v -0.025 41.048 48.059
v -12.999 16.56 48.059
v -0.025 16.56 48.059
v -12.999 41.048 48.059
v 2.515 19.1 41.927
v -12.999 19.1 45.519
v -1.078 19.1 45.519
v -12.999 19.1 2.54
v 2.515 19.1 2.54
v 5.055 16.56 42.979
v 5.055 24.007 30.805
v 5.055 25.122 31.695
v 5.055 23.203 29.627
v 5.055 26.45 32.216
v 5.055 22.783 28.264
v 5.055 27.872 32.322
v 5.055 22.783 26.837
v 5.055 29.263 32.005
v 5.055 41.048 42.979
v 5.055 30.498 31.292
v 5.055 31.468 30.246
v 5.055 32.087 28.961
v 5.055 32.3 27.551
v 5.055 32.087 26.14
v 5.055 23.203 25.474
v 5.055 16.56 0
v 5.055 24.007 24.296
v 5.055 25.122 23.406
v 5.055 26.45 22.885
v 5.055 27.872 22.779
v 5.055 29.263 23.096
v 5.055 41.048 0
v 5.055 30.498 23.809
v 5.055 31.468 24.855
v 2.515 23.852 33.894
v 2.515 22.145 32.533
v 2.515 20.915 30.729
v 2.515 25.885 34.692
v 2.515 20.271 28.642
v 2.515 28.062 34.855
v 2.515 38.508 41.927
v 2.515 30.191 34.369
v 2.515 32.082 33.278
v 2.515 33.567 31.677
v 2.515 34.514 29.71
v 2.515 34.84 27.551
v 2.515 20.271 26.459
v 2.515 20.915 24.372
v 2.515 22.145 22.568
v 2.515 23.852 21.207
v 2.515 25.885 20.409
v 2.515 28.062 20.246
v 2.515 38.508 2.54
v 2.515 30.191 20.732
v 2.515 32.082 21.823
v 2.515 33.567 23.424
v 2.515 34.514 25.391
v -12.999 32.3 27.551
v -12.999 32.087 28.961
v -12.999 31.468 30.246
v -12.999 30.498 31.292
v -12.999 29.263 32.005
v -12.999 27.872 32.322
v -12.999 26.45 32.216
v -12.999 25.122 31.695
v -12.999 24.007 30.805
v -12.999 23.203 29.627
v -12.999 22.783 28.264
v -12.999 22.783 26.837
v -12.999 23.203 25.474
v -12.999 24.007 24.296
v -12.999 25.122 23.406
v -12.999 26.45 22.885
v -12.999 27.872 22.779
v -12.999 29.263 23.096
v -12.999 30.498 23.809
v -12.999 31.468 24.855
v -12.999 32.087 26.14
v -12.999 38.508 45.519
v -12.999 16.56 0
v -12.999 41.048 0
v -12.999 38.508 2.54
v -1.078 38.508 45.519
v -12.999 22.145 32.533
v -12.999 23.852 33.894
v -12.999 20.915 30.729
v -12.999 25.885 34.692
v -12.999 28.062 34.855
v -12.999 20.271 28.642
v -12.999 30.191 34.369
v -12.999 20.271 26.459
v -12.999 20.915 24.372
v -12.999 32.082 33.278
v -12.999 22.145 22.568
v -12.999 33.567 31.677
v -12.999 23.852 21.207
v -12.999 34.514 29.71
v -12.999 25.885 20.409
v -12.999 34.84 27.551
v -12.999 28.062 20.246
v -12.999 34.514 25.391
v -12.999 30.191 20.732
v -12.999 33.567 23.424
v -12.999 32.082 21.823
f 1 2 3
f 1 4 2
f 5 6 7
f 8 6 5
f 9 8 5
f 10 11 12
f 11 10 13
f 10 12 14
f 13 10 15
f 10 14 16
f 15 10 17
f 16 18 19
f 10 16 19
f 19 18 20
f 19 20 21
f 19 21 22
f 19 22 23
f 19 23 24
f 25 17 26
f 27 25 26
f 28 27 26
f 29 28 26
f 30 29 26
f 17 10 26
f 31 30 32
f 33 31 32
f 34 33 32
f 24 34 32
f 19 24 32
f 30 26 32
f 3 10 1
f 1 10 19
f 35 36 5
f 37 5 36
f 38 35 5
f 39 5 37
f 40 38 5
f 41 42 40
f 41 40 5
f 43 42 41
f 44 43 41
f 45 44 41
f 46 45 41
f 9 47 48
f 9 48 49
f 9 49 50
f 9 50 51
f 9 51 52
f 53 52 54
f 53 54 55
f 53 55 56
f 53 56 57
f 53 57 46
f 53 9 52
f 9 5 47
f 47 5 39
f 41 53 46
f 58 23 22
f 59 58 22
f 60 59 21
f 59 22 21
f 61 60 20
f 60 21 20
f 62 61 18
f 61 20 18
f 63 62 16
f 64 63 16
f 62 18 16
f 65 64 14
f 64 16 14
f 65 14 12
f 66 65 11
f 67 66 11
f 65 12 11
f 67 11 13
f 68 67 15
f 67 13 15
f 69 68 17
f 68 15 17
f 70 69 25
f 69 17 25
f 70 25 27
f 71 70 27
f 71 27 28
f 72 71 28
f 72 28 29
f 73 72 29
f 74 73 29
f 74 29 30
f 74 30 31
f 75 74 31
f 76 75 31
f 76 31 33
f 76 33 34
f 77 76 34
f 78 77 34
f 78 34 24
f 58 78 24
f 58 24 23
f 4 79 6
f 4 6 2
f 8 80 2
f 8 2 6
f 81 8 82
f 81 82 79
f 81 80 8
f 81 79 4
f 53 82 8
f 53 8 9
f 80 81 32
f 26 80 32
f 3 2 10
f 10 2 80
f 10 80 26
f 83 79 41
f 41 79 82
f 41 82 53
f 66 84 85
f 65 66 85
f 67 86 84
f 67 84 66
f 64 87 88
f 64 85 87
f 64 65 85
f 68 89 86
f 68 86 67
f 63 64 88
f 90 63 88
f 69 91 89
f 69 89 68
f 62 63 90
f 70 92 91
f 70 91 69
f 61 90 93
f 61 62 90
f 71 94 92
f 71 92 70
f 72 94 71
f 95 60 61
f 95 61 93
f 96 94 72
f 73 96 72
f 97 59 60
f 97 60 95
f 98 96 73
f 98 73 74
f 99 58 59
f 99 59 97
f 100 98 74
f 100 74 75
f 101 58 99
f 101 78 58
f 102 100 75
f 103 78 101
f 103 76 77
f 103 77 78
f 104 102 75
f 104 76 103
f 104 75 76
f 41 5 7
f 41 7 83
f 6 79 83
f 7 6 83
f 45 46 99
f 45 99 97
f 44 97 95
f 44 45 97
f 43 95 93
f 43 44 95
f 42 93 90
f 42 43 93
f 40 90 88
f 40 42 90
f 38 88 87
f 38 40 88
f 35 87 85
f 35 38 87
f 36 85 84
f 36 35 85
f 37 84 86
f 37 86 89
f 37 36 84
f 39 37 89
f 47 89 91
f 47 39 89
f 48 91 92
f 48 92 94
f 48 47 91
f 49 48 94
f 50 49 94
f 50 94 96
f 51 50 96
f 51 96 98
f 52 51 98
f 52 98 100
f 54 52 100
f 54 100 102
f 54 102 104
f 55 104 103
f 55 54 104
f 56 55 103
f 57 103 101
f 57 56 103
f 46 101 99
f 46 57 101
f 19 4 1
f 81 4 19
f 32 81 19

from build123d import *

# Parameters (mm, degrees)
F0_W     = 18.0536359549
F0_H     = 24.487555027
F1_DEPTH = 48.0590760708
F2_R     = 4.7851705696
F3_DEPTH = 59.6192404628
F4_SIZE  = 5.08
F5_T     = -2.54


with BuildPart() as f1:
    # F0 (on Top) → F1 (new body)
    with BuildSketch(Plane.XY):
        with Locations((-3.9722770452, 28.8042277098)):
            Rectangle(F0_W, F0_H)
    extrude(amount=F1_DEPTH)

    # F2 (on face) → F3 (cut)
    with BuildSketch(Plane.YZ.offset(5.0545409322)):
        with Locations((27.5146439672, 27.5505185127)):
            Circle(F2_R)
    extrude(amount=-F3_DEPTH, mode=Mode.SUBTRACT)

    # F4
    f4_edges = [f1.edges().sort_by_distance(p)[0] for p in [
        (5.054541, 28.804228, 48.059076),
    ]]
    chamfer(f4_edges, length=F4_SIZE)

    # F5
    f5_openings = [f1.faces().sort_by_distance(p)[0] for p in [
        (-12.999095, 40.508625, 24.029538),
    ]]
    offset(amount=F5_T, openings=f5_openings)


solid = f1.part
